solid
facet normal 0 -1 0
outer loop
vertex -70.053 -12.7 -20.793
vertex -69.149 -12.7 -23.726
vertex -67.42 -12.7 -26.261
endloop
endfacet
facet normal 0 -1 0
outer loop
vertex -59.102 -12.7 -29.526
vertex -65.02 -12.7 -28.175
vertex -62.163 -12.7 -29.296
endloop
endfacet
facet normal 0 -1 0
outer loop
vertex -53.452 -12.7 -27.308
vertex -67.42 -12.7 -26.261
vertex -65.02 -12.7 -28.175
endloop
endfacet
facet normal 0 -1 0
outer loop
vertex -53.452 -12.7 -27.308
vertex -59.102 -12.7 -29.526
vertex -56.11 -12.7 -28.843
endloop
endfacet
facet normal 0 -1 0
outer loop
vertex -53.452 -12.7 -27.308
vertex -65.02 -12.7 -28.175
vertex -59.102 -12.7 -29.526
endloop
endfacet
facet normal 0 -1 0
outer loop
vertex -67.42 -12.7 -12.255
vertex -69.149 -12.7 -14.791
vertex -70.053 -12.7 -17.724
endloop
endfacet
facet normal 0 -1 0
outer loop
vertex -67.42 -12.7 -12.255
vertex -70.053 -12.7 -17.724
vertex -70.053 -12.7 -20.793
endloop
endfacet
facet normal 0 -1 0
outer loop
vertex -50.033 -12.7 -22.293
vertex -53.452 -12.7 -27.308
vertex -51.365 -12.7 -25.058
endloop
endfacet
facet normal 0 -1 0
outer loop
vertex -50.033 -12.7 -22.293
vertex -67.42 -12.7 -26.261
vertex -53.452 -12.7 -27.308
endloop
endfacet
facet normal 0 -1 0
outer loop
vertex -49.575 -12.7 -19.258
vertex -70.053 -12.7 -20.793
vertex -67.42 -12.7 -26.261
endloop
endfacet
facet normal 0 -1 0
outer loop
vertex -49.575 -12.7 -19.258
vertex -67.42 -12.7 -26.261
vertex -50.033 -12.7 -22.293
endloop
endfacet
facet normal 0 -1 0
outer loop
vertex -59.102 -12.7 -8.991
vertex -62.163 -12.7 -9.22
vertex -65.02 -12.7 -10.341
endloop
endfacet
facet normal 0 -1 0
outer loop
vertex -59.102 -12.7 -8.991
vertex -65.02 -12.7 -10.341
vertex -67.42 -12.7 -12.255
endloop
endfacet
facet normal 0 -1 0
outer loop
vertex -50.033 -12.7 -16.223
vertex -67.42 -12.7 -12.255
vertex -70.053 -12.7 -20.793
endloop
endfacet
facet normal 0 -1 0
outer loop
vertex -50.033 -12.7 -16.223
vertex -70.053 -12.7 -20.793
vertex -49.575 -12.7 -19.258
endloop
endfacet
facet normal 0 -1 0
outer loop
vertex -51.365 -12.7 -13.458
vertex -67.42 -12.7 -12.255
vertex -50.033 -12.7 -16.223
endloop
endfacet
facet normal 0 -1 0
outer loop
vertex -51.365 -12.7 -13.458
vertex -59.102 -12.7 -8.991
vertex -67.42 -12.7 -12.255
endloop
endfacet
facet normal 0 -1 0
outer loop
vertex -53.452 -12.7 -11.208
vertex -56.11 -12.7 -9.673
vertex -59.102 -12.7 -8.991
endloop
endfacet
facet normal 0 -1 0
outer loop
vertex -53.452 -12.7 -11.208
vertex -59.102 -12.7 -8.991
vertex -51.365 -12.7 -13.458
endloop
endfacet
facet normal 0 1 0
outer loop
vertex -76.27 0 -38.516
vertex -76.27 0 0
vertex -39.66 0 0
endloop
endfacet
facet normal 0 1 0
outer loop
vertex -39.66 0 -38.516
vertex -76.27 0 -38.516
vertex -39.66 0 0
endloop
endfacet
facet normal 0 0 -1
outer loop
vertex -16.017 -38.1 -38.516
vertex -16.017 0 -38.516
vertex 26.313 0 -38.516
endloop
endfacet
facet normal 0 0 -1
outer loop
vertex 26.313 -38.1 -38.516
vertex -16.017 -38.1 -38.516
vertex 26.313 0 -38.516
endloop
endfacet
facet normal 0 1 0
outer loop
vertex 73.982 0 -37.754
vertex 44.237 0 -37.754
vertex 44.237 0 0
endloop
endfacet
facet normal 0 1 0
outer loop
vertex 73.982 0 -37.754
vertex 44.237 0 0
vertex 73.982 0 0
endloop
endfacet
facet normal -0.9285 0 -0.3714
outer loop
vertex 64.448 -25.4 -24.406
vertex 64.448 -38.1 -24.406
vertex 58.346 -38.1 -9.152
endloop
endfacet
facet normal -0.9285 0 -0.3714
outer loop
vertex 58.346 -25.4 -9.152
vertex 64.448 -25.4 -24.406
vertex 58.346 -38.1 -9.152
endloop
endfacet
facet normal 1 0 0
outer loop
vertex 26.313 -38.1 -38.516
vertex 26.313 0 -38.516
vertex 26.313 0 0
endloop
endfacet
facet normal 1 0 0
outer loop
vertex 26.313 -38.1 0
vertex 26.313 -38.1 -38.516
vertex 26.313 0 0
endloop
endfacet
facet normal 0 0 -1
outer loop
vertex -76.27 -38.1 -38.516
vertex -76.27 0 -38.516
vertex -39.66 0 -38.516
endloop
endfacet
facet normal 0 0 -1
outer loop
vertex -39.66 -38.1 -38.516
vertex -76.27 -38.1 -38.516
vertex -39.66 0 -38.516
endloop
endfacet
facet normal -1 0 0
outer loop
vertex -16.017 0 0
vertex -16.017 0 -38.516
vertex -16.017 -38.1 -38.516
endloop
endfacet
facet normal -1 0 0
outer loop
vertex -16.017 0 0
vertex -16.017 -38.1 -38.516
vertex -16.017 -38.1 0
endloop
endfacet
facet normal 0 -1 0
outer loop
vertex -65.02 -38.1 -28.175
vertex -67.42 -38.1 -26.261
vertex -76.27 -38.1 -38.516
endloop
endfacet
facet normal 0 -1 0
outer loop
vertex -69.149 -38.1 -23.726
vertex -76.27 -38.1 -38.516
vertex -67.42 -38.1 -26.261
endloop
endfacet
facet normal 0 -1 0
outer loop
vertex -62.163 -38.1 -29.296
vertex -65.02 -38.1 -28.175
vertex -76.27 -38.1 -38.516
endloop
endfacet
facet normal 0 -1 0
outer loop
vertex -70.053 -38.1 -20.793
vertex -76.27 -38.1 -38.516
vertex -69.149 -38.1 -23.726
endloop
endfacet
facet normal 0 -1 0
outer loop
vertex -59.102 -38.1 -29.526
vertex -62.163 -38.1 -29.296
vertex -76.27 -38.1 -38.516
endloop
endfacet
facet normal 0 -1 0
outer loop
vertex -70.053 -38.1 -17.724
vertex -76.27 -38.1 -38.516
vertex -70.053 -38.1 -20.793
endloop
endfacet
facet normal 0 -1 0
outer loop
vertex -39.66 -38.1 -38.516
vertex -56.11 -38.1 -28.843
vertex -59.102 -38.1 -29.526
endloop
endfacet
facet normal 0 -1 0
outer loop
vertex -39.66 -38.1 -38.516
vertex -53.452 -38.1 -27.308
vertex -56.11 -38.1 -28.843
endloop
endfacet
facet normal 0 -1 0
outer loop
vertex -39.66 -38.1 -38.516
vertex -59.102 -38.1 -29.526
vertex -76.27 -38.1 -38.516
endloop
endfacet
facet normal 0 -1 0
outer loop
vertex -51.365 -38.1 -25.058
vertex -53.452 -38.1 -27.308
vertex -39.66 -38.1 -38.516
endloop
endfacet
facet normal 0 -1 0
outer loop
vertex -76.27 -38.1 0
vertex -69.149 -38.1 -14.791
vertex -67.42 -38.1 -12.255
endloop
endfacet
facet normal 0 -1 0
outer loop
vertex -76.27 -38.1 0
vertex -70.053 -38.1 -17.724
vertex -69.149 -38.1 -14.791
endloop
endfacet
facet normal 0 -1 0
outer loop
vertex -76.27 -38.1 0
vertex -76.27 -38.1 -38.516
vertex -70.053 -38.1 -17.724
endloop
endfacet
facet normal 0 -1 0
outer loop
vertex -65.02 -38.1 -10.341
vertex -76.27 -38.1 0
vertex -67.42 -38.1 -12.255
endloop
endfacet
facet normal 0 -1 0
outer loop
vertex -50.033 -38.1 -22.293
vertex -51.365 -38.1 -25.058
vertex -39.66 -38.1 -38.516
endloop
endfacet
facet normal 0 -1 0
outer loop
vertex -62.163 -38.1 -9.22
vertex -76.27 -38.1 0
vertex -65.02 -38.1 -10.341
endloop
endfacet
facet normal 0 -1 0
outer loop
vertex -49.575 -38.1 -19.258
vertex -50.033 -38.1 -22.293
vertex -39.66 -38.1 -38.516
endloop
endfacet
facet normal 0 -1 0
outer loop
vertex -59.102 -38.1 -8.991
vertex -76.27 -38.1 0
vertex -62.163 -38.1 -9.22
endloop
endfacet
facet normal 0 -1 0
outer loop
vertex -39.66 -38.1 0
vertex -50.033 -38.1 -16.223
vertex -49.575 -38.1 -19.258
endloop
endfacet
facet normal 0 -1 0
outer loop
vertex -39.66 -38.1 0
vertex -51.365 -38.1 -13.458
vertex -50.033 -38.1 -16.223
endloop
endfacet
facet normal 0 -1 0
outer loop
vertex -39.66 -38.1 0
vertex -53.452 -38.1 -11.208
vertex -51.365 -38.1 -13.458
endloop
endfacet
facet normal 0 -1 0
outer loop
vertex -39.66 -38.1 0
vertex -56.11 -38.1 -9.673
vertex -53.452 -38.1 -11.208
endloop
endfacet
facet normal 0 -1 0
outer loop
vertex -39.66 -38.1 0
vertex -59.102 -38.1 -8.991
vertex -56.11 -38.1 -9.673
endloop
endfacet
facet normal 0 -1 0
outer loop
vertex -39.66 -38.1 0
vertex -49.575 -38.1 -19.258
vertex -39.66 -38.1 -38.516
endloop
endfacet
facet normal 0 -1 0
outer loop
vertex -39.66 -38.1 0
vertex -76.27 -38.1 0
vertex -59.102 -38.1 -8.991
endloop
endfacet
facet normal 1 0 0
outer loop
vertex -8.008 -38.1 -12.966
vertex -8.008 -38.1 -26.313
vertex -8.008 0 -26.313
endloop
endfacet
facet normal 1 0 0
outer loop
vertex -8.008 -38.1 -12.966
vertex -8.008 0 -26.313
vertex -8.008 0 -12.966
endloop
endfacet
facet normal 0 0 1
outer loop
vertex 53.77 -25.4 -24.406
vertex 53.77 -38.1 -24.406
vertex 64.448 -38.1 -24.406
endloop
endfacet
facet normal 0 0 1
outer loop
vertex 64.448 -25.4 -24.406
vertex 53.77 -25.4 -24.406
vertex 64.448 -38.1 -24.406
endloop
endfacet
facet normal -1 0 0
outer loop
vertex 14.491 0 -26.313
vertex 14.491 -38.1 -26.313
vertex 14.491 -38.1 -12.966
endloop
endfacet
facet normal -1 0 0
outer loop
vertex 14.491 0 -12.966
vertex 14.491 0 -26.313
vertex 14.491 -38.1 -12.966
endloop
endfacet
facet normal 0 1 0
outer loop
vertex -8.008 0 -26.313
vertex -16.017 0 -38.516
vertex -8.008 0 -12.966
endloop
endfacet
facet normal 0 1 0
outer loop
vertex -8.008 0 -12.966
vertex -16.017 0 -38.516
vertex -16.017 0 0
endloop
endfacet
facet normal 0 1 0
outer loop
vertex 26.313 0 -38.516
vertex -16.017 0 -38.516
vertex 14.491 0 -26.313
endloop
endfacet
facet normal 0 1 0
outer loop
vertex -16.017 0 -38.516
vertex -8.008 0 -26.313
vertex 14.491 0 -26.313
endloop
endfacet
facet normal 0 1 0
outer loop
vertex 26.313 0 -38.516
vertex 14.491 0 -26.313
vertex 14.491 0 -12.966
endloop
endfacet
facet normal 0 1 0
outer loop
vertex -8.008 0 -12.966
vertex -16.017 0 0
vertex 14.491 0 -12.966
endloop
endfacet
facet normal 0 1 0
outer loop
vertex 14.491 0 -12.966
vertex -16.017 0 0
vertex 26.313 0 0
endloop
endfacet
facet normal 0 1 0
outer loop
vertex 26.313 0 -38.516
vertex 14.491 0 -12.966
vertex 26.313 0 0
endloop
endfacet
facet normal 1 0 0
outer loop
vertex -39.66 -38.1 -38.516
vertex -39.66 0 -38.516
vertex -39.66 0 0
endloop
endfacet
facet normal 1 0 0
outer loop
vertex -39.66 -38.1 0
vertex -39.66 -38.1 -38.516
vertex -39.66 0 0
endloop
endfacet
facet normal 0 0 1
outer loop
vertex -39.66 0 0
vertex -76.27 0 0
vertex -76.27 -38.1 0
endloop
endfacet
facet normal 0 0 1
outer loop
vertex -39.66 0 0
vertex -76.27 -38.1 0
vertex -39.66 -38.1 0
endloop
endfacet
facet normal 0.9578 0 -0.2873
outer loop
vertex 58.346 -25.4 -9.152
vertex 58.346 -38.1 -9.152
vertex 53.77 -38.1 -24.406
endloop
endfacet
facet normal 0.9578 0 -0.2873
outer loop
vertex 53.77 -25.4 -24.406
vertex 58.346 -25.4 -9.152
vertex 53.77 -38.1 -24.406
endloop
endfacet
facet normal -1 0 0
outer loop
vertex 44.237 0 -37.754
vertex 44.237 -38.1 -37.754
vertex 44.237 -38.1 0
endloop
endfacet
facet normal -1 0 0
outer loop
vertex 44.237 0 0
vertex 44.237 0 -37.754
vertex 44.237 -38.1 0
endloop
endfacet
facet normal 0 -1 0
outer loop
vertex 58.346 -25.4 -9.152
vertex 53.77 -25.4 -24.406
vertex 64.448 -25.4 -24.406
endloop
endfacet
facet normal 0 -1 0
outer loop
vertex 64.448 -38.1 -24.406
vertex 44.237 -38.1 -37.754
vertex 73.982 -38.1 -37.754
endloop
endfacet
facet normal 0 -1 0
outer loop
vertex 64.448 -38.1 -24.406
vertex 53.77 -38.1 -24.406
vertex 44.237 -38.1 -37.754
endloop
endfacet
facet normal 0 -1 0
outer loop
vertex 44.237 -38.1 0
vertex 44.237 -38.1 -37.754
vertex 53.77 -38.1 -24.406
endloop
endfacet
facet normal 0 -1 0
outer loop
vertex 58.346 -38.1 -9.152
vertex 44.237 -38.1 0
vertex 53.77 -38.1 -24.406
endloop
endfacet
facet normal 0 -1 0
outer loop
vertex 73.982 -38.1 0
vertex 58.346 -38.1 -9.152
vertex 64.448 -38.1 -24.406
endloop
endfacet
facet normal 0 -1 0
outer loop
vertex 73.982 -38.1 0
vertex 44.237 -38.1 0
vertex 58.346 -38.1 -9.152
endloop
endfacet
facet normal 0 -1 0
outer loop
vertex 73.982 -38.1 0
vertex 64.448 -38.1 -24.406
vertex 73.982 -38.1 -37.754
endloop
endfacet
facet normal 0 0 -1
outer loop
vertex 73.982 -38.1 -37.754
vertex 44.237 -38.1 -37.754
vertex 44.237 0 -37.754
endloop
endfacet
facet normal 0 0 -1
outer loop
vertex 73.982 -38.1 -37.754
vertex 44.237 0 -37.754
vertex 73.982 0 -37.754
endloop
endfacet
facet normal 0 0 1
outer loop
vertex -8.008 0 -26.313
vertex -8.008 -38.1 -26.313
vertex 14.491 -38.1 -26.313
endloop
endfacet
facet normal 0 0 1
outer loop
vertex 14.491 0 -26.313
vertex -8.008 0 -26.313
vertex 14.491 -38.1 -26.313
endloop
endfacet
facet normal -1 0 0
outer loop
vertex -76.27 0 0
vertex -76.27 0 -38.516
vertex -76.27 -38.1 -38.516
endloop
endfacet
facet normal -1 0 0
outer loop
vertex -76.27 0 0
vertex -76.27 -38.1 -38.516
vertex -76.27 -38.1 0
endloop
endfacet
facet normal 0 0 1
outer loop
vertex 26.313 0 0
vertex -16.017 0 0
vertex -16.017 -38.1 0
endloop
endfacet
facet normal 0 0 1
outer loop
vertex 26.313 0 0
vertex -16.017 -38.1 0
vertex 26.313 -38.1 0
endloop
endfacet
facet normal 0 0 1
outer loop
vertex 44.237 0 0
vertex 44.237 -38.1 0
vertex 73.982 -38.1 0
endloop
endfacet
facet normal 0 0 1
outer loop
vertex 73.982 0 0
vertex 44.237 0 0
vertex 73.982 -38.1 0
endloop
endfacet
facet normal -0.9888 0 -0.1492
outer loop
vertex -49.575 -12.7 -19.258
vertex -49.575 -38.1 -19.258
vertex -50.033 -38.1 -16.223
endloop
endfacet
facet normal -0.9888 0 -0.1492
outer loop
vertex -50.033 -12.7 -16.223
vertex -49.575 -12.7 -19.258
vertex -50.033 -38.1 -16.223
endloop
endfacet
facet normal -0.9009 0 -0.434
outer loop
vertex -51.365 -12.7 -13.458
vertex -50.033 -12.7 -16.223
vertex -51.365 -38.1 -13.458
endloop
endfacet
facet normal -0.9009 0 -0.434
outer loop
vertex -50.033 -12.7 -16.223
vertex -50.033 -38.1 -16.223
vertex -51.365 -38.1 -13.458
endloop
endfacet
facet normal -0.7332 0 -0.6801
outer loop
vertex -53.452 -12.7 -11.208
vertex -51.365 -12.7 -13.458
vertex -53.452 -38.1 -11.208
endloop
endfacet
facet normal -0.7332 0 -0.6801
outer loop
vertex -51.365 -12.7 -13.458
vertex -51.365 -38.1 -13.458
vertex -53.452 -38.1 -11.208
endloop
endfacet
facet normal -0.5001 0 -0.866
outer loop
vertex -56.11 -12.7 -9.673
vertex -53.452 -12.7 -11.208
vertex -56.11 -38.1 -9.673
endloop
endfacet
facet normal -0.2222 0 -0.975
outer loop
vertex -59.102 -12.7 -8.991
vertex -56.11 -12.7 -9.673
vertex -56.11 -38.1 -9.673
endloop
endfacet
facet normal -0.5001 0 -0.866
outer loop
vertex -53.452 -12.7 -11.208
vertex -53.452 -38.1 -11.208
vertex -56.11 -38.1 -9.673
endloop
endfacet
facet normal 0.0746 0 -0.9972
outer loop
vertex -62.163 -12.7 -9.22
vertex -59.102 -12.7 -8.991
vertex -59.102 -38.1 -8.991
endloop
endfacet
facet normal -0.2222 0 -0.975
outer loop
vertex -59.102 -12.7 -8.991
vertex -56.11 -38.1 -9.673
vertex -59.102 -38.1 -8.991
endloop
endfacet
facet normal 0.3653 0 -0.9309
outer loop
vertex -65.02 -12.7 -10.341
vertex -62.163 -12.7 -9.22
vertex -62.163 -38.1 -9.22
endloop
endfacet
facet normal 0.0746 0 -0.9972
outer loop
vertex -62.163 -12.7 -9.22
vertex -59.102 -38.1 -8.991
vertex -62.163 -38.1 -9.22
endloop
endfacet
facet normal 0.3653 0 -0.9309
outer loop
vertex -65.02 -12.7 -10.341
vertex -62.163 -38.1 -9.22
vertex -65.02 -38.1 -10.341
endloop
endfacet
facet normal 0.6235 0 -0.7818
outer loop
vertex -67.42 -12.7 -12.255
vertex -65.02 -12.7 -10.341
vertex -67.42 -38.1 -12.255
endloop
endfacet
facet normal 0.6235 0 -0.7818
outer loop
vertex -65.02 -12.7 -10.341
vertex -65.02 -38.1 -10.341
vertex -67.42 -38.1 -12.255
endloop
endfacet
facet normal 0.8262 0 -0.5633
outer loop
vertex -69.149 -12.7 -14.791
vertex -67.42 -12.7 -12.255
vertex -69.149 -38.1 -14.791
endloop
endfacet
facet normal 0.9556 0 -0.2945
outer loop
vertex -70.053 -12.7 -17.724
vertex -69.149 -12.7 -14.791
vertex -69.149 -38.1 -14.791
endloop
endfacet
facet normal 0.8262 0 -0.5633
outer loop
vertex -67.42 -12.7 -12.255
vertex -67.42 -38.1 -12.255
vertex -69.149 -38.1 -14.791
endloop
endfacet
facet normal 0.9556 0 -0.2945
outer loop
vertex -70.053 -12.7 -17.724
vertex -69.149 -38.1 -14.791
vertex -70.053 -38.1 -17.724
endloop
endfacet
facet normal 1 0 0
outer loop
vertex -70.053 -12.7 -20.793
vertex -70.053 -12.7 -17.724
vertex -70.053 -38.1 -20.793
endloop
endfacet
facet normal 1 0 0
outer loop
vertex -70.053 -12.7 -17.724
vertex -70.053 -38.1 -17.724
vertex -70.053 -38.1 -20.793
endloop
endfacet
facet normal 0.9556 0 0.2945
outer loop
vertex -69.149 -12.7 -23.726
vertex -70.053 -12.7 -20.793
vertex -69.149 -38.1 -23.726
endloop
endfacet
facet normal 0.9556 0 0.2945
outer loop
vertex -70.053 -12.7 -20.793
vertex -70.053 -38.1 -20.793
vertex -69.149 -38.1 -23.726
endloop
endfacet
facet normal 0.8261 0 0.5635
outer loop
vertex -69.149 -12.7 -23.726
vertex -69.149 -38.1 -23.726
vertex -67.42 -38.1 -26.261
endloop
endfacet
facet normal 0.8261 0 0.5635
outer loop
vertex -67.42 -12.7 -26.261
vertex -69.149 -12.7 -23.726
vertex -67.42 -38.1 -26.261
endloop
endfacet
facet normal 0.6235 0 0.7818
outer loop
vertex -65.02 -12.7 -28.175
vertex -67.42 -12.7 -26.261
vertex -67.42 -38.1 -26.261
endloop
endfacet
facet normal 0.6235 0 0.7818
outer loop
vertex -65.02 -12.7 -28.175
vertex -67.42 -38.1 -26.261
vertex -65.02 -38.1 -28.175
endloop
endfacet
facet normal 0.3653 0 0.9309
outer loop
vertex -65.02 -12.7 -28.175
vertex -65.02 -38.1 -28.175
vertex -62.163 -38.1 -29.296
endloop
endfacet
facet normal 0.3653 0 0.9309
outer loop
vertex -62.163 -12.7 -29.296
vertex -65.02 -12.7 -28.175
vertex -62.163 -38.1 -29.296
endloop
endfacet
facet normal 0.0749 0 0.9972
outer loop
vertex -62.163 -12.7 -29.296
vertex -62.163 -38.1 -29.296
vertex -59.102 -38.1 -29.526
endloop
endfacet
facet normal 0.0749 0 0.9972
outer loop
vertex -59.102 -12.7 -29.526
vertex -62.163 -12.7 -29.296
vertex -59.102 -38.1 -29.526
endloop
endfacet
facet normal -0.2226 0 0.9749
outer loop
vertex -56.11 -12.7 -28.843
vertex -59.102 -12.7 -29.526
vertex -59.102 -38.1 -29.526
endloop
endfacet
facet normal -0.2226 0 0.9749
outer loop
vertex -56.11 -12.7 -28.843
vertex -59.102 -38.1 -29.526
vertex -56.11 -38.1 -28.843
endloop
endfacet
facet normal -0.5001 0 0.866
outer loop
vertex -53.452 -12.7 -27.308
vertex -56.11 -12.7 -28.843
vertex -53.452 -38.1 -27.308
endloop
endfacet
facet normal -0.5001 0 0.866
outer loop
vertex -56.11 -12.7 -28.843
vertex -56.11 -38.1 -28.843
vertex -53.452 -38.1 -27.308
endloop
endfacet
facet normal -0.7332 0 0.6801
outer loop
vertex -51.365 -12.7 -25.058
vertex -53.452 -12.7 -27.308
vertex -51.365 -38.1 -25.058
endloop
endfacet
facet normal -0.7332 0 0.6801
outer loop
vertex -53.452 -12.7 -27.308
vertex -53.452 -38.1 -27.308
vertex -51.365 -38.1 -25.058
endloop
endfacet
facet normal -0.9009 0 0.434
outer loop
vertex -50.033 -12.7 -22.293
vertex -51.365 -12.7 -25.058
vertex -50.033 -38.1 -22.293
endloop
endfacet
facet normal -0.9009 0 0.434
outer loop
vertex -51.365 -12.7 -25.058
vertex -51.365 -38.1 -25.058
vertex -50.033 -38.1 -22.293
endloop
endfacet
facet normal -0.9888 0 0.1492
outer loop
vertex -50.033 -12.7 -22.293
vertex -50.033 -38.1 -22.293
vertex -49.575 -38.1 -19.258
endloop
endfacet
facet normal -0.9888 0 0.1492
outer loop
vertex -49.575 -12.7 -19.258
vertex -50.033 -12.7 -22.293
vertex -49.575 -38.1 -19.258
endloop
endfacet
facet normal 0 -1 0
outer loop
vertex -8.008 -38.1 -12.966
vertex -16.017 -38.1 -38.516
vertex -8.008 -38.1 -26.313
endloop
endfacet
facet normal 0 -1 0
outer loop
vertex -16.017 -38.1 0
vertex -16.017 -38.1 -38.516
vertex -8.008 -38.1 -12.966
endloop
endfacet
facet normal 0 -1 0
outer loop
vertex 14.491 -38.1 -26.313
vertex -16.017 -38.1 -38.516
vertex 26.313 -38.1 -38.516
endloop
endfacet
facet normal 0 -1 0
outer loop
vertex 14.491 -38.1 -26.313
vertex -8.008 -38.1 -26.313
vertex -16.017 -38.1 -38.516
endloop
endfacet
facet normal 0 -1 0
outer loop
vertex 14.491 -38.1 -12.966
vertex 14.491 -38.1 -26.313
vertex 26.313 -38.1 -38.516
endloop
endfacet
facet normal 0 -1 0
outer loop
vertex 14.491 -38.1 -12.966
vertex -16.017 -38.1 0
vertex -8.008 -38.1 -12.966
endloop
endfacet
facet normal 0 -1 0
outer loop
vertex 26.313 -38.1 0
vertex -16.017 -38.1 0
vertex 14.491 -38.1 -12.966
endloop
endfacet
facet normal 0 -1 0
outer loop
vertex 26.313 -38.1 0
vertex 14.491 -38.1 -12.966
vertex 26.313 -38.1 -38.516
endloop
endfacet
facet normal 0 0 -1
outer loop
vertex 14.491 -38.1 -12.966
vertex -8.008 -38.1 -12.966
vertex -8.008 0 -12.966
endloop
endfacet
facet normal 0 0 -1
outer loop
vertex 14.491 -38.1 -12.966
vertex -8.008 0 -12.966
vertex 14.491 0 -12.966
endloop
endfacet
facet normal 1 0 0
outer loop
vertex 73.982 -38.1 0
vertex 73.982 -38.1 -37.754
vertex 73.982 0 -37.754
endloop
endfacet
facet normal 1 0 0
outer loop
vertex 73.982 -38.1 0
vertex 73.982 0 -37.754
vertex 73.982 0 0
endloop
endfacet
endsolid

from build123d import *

# Parameters (mm, degrees)
F0_W      = 36.6095416248
F0_H      = 38.5162867606
F5_DEPTH  = 38.1
F2_W      = 42.3297788948
F2_H      = 38.5162867606
F6_DEPTH  = 38.1
F4_W      = 29.745247215
F4_H      = 37.7535894513
F7_DEPTH  = 38.1
F13_DEPTH = 12.7
F11_W     = 22.4996116012
F11_H     = 13.3472280577
F14_DEPTH = 50.8
F10_R     = 10.2964304388
F15_DEPTH = 25.4


# Not quite as in the source:
# - the program builds the solid bodies; features that only make, move or delete a surface that nothing else refers to are left out


with BuildPart() as f5:
    # F0 (on Front) → F5 (new body)
    with BuildSketch(Plane.XZ):
        with Locations((-57.9651016742, -19.2581433803)):
            Rectangle(F0_W, F0_H)
    extrude(amount=F5_DEPTH)

    # F10 (on face) → F15 (cut)
    with BuildSketch(Plane.XZ.offset(38.1)):
        with Locations((-59.8718486726, -19.2581433803)):
            Circle(F10_R)
    extrude(amount=-F15_DEPTH, mode=Mode.SUBTRACT)


with BuildPart() as f6:
    # F2 (on Front) → F6 (new body)
    with BuildSketch(Plane.XZ):
        with Locations((5.148219876, -19.2581433803)):
            Rectangle(F2_W, F2_H)
    extrude(amount=F6_DEPTH)

    # F11 (on face) → F14 (cut)
    with BuildSketch(Plane.XZ.offset(38.1)):
        with Locations((3.2414672896, -19.6394915693)):
            Rectangle(F11_W, F11_H)
    extrude(amount=-F14_DEPTH, mode=Mode.SUBTRACT)


with BuildPart() as f7:
    # F4 (on Front) → F7 (new body)
    with BuildSketch(Plane.XZ):
        with Locations((59.109153226, -18.8767947257)):
            Rectangle(F4_W, F4_H)
    extrude(amount=F7_DEPTH)

    # F12 (on face) → F13 (cut)
    with BuildSketch(Plane.XZ.offset(38.1)):
        Polygon((58.3464540541, -9.1523844749), (53.7702590227, -24.4063585997), (64.448043704, -24.4063585997), align=None)
    extrude(amount=-F13_DEPTH, mode=Mode.SUBTRACT)


solid = Compound([f5.part, f6.part, f7.part])
